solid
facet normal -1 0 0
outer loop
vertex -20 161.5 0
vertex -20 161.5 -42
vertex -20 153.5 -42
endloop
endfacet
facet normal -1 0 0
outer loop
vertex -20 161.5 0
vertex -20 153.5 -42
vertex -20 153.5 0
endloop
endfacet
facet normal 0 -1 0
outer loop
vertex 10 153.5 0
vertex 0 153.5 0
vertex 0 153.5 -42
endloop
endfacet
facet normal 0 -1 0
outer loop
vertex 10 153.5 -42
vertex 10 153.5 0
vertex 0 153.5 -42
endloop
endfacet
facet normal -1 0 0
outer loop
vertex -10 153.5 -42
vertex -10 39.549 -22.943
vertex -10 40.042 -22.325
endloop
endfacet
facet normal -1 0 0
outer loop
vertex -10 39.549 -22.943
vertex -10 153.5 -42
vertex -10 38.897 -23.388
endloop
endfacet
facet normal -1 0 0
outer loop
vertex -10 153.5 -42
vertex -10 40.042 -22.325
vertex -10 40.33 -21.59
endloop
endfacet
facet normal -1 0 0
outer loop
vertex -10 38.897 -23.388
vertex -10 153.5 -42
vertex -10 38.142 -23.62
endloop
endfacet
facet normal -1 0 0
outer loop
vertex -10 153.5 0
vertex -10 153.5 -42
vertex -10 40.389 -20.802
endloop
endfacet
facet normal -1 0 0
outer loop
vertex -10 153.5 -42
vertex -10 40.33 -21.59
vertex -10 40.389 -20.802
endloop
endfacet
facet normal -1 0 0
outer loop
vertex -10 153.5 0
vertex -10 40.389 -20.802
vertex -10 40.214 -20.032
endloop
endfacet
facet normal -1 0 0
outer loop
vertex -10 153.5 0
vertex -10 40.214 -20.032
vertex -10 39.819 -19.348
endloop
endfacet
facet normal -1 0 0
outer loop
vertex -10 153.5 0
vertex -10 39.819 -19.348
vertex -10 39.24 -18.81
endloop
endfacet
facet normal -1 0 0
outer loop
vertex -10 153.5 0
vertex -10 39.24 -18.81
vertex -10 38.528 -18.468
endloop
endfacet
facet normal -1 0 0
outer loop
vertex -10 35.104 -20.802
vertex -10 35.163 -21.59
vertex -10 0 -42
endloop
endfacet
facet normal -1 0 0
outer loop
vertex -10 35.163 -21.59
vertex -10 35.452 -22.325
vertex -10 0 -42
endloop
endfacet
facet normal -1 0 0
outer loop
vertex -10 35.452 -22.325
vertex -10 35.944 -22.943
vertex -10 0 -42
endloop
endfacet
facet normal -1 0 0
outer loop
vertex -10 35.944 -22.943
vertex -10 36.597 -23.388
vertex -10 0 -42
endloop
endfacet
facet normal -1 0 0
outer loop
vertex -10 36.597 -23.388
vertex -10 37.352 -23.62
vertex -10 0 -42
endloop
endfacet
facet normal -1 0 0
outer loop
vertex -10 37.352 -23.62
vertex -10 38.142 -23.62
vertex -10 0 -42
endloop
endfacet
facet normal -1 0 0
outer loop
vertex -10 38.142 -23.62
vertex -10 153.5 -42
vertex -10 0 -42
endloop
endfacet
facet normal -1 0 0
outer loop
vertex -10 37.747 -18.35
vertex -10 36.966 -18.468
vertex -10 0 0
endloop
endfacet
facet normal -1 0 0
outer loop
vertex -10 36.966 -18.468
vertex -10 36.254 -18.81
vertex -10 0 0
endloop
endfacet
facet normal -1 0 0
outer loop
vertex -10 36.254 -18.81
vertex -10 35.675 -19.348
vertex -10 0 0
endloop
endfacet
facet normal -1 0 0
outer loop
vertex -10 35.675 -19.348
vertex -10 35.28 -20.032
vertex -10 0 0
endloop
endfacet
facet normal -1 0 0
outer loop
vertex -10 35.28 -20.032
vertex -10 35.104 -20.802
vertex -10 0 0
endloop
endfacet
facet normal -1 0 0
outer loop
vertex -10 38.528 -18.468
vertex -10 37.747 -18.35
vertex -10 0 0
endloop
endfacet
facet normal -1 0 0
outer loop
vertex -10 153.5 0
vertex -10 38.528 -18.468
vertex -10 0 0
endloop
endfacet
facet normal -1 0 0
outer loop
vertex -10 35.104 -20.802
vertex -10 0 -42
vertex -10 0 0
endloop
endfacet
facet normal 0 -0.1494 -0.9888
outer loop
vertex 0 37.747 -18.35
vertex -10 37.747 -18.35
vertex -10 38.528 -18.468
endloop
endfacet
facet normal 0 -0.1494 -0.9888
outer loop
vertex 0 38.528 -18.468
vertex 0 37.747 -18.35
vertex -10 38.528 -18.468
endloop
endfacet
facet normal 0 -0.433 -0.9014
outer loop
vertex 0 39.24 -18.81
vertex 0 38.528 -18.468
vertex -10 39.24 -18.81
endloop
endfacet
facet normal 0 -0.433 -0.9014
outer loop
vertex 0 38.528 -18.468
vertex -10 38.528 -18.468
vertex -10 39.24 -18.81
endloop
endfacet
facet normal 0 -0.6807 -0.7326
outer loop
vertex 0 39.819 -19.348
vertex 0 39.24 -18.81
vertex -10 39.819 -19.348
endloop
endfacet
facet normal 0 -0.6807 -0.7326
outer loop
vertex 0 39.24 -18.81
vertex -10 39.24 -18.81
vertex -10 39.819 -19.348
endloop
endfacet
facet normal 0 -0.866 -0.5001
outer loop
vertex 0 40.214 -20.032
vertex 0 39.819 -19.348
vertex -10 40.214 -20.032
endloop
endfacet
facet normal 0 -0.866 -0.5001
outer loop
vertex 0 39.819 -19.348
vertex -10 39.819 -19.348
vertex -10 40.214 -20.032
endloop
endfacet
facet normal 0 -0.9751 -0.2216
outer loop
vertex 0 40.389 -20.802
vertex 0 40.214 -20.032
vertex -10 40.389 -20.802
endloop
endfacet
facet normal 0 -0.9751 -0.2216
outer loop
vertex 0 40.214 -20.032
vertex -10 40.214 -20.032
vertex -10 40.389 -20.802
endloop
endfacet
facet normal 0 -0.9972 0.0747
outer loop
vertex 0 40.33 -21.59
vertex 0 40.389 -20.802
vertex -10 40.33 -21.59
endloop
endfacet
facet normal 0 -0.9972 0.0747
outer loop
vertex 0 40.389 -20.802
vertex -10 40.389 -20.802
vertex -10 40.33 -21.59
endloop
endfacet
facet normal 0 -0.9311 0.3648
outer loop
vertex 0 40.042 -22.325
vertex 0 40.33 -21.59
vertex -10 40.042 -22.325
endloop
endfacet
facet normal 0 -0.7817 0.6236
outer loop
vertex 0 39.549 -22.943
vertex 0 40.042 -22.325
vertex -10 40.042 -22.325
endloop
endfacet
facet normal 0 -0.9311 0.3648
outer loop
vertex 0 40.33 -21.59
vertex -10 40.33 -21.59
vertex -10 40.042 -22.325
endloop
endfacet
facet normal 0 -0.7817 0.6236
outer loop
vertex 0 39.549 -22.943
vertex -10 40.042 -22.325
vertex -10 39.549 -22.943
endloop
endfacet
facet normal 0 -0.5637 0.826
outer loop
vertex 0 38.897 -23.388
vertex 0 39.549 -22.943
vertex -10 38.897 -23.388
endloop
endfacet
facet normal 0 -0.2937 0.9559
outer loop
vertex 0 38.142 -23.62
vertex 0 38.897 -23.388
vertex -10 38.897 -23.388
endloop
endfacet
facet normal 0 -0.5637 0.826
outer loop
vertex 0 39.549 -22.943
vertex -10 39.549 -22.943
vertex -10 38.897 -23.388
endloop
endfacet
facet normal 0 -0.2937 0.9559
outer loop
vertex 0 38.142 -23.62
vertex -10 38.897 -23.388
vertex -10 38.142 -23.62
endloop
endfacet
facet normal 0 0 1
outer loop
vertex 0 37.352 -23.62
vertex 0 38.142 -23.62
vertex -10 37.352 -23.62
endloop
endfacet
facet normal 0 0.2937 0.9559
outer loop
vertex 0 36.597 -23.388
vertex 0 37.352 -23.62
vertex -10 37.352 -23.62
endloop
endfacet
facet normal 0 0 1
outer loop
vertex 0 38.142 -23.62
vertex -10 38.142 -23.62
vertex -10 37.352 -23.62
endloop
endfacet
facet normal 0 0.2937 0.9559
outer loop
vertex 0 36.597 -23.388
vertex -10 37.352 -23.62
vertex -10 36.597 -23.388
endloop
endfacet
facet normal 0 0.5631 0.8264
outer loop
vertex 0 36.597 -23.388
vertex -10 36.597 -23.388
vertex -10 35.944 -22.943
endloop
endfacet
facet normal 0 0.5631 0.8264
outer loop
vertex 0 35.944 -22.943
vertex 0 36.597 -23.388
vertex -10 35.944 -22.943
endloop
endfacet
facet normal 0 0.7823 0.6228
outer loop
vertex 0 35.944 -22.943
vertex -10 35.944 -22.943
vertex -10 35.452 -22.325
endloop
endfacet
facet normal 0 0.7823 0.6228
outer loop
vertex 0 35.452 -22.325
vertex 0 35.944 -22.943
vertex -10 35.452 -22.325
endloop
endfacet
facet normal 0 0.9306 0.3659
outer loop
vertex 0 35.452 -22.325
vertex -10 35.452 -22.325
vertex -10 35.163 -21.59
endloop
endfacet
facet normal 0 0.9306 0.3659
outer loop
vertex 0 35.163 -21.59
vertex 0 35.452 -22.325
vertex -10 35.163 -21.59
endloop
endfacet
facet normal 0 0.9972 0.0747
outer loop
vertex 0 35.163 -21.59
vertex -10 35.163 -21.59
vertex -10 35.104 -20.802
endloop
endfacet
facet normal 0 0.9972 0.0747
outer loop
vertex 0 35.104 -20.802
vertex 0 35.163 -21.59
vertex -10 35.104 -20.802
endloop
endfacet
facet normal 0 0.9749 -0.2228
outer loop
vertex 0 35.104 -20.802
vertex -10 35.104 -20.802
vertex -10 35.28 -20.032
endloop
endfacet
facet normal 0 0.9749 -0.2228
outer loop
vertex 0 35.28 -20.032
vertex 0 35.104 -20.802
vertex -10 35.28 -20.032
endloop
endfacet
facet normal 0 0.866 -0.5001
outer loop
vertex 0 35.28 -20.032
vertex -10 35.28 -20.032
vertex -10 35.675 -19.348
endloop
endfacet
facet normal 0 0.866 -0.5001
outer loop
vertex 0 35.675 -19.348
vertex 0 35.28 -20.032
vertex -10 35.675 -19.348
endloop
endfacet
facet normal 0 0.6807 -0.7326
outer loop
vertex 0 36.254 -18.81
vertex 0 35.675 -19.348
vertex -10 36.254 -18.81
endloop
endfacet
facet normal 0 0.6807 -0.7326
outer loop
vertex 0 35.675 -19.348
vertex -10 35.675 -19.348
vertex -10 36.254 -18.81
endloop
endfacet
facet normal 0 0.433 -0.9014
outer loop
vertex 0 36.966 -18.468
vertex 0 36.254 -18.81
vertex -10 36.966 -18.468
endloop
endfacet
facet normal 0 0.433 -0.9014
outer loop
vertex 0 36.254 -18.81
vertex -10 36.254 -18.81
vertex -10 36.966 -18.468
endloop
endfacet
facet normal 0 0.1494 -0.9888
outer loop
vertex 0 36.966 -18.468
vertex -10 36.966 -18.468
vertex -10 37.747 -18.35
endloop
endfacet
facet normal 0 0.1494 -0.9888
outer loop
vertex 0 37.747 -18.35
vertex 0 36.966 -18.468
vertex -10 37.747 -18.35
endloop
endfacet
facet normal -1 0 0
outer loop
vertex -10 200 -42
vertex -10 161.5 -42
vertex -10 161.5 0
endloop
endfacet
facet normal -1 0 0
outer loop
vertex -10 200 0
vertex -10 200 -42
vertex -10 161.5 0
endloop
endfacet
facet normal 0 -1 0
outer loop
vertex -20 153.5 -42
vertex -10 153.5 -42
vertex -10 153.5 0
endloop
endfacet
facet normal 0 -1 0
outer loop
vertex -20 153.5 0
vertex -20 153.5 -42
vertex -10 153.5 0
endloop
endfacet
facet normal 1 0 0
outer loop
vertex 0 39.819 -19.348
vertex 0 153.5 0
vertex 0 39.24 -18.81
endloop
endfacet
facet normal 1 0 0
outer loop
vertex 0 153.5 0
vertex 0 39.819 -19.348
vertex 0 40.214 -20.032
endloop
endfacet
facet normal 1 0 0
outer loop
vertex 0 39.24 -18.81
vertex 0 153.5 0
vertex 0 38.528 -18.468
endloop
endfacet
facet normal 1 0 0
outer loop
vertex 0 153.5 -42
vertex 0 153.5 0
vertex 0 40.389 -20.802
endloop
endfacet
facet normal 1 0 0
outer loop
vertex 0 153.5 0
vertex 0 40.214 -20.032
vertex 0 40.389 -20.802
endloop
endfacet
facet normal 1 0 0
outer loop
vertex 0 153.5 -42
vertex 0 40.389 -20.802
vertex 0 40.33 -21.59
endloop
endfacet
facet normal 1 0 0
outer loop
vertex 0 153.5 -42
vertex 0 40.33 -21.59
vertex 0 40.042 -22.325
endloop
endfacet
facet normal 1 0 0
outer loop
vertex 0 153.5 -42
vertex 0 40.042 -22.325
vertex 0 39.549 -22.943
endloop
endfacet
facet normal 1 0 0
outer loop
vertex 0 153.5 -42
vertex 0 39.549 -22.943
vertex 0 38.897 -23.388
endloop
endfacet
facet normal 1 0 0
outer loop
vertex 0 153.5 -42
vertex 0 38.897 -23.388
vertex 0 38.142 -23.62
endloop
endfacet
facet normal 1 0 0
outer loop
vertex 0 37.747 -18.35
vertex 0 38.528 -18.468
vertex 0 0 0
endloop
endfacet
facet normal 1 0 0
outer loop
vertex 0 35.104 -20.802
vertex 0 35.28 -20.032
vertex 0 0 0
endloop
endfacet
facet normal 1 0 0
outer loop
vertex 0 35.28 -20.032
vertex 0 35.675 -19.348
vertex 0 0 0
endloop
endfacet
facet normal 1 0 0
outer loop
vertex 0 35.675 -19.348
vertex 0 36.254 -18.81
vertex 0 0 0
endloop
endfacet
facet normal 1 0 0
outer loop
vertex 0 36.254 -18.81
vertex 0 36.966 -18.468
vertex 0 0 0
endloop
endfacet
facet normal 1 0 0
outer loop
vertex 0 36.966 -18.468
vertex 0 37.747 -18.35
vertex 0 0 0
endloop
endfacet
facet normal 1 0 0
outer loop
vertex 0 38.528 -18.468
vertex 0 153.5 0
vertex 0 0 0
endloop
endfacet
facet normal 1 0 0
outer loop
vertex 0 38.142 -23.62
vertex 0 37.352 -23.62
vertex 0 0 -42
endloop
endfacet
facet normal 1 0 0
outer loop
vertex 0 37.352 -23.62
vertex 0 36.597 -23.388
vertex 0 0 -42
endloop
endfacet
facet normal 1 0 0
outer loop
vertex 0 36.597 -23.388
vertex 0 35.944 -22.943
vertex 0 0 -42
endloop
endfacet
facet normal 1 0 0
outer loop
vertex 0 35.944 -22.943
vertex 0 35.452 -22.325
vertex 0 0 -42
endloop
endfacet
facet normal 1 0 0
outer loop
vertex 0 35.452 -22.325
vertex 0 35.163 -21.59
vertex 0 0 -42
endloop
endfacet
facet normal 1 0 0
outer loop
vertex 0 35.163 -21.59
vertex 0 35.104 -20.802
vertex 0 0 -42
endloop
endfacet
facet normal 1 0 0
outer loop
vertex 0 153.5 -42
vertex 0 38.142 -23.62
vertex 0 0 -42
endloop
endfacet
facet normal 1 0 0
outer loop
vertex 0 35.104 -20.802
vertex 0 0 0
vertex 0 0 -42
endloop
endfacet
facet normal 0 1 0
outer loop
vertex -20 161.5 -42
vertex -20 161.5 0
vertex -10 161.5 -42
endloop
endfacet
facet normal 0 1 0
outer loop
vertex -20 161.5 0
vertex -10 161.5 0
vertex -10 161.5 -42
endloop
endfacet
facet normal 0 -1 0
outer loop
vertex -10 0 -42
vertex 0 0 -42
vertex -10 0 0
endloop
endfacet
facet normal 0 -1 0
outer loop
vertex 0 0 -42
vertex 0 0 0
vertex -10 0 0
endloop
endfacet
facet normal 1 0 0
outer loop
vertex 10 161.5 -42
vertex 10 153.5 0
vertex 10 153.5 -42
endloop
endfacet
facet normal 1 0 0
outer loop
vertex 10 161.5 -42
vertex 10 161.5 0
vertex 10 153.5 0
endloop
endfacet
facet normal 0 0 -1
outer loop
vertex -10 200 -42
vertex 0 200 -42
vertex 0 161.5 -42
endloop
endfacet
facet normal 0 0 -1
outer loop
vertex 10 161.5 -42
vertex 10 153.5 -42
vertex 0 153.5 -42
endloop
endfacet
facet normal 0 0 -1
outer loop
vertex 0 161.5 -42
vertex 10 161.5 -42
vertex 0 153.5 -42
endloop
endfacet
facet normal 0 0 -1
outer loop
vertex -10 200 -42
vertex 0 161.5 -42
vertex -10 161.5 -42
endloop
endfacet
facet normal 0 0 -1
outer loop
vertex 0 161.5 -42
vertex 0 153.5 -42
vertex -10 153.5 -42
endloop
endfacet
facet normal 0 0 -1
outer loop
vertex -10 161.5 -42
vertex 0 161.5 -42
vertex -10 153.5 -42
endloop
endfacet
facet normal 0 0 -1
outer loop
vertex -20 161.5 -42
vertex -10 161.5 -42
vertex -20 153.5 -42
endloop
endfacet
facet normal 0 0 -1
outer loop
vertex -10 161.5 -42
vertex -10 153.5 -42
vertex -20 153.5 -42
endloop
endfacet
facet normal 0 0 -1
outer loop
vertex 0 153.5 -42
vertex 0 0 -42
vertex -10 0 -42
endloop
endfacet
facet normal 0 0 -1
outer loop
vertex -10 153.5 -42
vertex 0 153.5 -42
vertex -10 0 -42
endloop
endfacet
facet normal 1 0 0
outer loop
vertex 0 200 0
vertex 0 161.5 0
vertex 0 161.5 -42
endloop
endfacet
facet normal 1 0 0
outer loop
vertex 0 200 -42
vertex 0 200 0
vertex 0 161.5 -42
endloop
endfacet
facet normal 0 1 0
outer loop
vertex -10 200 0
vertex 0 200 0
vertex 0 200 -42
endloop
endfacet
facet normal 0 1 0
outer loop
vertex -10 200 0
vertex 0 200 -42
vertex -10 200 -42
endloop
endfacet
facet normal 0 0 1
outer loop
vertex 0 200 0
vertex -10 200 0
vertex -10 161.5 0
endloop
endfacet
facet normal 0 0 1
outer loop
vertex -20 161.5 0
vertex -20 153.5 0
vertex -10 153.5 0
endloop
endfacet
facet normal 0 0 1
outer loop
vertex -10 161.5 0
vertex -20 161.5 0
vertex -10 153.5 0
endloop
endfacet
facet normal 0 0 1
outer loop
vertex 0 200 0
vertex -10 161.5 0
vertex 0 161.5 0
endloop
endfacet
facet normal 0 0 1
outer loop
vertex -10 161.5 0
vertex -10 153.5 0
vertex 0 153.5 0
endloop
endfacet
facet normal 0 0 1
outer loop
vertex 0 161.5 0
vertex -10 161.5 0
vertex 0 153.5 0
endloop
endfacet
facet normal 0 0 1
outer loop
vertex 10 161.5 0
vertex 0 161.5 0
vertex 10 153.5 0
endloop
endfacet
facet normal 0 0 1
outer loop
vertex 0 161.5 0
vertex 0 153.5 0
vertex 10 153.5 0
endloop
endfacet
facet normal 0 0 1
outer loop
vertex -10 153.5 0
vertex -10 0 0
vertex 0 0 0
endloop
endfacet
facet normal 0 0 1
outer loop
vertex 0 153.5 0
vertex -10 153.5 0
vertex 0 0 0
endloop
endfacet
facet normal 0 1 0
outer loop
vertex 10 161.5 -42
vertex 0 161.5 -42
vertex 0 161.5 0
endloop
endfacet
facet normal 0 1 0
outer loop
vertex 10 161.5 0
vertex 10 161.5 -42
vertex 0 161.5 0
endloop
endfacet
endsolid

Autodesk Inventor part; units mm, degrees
ref_plane "YZ Plane" through (0, 0, 0) normal (1, 0, 0) x (0, 1, 0)
ref_plane "XZ Plane" through (0, 0, 0) normal (0, 1, 0) x (-1, 0, 0)
ref_plane "XY Plane" through (0, 0, 0) normal (0, 0, 1) x (1, 0, 0)
sketch "Sketch1" plane through (0, 0, 0) normal (0, 1, 0) x (-1, 0, 0)
  line L0 (0, 0) -> (0, -42)
  line L1 (0, -42) -> (10, -42)
  line L2 (10, -42) -> (10, 0)
  line L3 (10, 0) -> (0, 0)
  dimension "d0" = 42
  dimension "d1" = 10
  dimension "d2" = 42
extrude "Extrusion1" add sketch "Sketch1" along normal blind 200
sketch "Sketch2" plane through (0, 0, 0) normal (1, 0, 0) x (0, 0, -1)
  line L0 (42, 200) -> (0, 200) projected
  line L1 (42, 200) -> (42, 161.5)
  line L2 (42, 0) -> (42, 200) projected
  line L3 (42, 161.5) -> (0, 161.5)
  line L4 (0, 0) -> (0, 200) projected
  line L5 (0, 161.5) -> (0, 153.5)
  line L6 (0, 153.5) -> (42, 153.5)
  line L7 (42, 153.5) -> (42, 161.5)
  dimension "d5" = 38.5
  dimension "d6" = 8
extrude "Extrusion2" add sketch "Sketch2" along normal blind 10 contours L2 L6 L4 L3
sketch "Sketch3" plane through (-10, 0, -42) normal (-1, 0, 0) x (0, 0, 1)
  line L0 (42, 161.5) -> (42, 200) projected
  line L1 (42, 200) -> (42, 161.5)
  line L2 (42, 161.5) -> (0, 161.5)
  line L3 (0, 153.5) -> (42, 153.5) projected
  line L4 (0, 161.5) -> (0, 153.5)
  line L5 (42, 161.5) -> (42, 153.5) projected
  line L6 (0, 153.5) -> (42, 153.5)
  line L7 (42, 153.5) -> (42, 161.5)
  point P0 (42, 0)
  dimension "d9" = 38.5
extrude "Extrusion3" add sketch "Sketch3" along normal blind 10
sketch "Sketch4" plane through (-10, 0, -42) normal (-1, 0, 0) x (0, 0, 1)
  line L0 (42, 0) -> (42, 153.5) projected
  line L1 (42, 18.0001) -> (0, 57.4937)
  line L2 (0, 0) -> (0, 153.5) projected
  circle A0 centre (21, 37.7469) radius 2.65
  dimension "d12" = 5.3
extrude "Extrusion4" cut sketch "Sketch4" against normal blind 10
properties part number "pared"
